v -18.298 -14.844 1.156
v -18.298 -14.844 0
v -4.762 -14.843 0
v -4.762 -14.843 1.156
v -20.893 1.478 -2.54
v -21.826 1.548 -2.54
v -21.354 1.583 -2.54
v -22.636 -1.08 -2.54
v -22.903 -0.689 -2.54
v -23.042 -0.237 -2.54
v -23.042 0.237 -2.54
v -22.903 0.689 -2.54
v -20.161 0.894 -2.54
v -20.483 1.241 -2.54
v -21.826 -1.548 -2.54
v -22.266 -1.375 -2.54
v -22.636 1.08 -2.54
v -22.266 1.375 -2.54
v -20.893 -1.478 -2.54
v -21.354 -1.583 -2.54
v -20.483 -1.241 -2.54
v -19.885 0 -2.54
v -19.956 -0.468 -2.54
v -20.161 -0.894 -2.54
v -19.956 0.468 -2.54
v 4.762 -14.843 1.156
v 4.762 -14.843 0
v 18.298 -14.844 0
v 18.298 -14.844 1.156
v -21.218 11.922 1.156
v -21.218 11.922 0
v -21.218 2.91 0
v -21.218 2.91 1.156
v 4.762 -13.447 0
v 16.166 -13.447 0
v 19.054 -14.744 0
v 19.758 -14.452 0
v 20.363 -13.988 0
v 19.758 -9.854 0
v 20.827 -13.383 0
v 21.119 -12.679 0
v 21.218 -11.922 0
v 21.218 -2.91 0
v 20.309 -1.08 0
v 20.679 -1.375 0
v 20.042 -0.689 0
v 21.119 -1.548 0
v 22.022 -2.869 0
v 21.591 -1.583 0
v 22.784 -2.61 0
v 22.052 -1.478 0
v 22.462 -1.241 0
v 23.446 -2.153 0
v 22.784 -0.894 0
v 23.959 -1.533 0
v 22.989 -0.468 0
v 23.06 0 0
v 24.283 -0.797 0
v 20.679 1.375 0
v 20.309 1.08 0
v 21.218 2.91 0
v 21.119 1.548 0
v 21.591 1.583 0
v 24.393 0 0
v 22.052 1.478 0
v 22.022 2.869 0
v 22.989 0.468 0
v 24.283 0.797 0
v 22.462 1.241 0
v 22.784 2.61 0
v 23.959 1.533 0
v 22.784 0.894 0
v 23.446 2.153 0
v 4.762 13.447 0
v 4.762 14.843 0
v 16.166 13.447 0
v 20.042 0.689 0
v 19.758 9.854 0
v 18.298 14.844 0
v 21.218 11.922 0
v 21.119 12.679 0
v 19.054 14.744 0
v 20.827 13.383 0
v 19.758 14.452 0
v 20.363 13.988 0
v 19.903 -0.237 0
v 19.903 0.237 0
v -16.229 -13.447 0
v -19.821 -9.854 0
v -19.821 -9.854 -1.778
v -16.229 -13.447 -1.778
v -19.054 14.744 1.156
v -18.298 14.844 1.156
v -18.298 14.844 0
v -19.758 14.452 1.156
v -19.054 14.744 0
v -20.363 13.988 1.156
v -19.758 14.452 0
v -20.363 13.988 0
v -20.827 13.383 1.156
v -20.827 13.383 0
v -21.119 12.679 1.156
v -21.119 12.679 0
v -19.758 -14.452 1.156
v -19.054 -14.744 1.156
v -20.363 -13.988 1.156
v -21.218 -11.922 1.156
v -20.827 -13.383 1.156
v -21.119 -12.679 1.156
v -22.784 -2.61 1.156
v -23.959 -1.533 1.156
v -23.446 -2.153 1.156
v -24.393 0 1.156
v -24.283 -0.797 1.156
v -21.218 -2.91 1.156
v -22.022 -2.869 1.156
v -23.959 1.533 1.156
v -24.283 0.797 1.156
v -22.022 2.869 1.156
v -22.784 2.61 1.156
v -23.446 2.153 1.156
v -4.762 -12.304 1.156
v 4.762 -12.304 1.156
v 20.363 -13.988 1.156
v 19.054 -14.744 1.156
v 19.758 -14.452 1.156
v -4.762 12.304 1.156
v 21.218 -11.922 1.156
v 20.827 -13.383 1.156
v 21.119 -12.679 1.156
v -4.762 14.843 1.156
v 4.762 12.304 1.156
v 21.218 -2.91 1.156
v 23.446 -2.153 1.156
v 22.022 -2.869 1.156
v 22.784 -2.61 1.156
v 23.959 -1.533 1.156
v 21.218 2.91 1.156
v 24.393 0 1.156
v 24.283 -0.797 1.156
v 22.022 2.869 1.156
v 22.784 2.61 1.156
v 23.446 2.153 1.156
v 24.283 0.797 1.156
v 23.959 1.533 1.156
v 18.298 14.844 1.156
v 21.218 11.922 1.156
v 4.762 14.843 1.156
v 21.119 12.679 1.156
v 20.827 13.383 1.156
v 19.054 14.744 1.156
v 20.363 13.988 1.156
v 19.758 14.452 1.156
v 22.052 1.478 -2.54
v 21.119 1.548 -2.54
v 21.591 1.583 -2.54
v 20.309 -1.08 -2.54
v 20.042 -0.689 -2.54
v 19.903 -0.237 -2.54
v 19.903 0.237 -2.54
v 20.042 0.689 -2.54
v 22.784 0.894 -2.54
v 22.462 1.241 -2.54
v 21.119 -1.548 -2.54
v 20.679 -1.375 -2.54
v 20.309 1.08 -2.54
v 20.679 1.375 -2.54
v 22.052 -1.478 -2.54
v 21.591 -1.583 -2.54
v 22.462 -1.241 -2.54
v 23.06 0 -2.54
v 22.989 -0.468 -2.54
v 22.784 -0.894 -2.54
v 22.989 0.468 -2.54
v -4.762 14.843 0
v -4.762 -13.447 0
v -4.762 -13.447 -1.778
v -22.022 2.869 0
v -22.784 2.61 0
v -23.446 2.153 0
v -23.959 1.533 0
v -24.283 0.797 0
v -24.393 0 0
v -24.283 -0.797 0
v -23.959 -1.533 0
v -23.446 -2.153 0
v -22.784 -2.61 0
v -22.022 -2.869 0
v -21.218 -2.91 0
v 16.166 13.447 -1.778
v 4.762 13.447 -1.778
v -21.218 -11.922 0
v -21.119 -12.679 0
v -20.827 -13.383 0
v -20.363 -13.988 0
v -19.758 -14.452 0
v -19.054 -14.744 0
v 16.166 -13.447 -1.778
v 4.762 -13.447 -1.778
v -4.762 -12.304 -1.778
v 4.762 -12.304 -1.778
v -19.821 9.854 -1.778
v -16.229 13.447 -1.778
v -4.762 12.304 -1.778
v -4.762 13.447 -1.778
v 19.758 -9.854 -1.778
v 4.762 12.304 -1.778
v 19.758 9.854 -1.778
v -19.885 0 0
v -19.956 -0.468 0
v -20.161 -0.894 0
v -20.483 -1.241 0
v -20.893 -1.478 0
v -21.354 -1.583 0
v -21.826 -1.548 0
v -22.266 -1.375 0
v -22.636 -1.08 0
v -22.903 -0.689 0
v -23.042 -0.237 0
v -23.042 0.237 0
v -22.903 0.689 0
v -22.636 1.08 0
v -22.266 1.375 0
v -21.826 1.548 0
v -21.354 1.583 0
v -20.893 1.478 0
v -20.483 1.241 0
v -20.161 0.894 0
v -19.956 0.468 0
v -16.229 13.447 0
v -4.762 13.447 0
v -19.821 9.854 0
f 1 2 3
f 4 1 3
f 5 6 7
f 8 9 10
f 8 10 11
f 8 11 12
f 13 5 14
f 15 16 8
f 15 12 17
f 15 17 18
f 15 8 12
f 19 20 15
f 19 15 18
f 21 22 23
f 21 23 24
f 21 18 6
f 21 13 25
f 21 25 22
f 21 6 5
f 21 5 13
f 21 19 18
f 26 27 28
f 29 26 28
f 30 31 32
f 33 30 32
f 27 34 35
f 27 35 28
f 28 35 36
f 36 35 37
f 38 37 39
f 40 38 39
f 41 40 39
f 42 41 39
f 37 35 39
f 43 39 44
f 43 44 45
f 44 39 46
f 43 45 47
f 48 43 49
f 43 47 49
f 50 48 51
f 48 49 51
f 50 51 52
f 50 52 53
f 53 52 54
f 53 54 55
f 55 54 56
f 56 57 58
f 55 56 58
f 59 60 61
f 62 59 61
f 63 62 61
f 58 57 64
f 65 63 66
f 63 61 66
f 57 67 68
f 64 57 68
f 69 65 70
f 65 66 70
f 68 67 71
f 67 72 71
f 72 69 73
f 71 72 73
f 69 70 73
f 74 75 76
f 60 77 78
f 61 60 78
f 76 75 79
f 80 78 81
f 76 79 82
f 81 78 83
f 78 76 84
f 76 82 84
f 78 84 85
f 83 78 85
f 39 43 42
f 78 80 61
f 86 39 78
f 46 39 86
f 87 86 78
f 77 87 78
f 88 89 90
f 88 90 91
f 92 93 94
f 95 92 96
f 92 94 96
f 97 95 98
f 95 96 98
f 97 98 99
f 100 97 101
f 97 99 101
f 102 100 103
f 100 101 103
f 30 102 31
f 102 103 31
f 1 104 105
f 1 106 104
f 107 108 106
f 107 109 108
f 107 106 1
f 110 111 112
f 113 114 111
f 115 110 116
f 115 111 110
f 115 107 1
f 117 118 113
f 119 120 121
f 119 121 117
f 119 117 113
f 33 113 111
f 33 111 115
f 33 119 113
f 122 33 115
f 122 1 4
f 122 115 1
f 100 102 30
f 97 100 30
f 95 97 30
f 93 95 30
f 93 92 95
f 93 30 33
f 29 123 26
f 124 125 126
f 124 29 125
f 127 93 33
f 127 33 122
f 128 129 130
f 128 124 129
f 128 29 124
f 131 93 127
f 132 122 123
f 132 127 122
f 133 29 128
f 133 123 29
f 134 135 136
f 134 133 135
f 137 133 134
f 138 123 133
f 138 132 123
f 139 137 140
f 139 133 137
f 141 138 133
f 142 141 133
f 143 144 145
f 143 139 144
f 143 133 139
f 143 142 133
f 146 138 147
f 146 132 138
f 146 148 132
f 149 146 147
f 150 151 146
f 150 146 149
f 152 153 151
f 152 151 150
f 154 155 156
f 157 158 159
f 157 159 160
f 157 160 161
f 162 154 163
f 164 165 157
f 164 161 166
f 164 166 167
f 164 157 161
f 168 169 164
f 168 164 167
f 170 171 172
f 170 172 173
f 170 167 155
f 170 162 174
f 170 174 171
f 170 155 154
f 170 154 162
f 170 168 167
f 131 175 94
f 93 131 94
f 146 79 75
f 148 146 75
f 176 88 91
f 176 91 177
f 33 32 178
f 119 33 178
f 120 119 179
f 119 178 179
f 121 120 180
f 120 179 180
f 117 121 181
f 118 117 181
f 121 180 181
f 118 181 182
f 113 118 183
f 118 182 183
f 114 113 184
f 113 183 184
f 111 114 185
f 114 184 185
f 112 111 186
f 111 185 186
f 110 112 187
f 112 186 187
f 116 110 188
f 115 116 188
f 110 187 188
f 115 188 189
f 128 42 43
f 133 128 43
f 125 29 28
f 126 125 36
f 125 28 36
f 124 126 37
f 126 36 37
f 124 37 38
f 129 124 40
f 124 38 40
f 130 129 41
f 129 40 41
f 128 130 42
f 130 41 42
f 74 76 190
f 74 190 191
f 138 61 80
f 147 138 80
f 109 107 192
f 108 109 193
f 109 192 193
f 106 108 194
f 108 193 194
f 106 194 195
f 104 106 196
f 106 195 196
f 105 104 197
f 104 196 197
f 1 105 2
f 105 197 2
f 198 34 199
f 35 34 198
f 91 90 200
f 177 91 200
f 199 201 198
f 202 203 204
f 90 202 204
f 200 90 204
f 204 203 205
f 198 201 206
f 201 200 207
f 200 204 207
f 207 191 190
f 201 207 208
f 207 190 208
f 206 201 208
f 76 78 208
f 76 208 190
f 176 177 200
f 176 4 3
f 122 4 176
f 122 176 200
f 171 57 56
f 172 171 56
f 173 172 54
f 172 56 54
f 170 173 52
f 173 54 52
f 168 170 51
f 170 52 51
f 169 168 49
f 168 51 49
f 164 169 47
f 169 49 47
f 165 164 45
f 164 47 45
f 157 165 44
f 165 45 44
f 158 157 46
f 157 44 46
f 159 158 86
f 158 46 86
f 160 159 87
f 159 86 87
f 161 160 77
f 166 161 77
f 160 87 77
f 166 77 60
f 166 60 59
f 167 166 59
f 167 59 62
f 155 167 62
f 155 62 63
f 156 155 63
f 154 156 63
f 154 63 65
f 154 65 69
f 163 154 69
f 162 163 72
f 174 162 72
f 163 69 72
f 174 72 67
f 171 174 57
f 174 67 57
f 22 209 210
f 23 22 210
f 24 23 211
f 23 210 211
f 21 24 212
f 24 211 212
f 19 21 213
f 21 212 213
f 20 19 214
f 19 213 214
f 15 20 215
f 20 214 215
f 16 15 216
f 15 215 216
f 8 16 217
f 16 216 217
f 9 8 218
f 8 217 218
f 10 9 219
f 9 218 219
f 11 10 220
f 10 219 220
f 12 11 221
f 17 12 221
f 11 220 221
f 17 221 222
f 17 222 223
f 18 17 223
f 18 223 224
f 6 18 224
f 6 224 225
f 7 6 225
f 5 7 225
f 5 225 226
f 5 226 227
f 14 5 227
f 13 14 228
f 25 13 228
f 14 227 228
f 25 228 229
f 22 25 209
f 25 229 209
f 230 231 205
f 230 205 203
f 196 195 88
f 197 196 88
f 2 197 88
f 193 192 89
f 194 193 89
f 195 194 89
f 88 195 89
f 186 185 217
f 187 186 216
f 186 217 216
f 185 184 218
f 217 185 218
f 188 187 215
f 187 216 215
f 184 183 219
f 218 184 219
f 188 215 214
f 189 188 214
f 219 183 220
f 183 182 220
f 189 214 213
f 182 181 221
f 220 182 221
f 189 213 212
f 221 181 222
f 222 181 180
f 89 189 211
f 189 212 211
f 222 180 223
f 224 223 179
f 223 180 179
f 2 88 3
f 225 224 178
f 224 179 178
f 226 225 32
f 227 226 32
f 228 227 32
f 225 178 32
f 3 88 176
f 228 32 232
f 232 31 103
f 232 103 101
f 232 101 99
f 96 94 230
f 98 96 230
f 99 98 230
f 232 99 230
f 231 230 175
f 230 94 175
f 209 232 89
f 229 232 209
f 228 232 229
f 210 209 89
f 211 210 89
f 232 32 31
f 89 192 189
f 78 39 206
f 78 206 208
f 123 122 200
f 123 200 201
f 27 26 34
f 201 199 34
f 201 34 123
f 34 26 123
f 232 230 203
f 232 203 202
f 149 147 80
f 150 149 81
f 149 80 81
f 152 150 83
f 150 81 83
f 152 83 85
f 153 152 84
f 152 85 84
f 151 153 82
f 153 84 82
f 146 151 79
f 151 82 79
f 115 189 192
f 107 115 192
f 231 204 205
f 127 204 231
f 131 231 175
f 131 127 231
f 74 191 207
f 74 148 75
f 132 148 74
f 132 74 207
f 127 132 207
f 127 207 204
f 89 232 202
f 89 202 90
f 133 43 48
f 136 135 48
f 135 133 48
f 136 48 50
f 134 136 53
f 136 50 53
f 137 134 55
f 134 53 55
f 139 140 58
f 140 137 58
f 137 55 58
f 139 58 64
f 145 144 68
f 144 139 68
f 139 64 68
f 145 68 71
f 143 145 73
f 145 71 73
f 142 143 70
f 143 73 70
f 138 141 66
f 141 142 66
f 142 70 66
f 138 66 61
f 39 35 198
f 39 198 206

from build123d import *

# Parameters (mm, degrees)
BOSS_EXTRUDE1_DEPTH = 1.5875
SKETCH3_W           = 9.525
SKETCH3_H           = 2.54
CUT_EXTRUDE1_DEPTH  = 29.598819744
SKETCH4_R           = 1.5875
BOSS_EXTRUDE2_DEPTH = 2.54
BOSS_EXTRUDE3_DEPTH = 1.778
SKETCH6_W           = 48.787
SKETCH6_H           = 0.4318
CUT_EXTRUDE2_DEPTH  = 19.05


with BuildPart() as part:
    # Sketch2 → Boss-Extrude1 (new body)
    with BuildSketch(Plane.XY):
        with BuildLine():
            Line((21.2185, 2.909935566), (21.2185, 11.9225))
            ThreePointArc((21.2185, 11.9225), (20.362958908, 13.987958908), (18.2975, 14.8435))
            Line((18.2975, 14.8435), (-18.2975, 14.8435))
            ThreePointArc((-18.2975, 14.8435), (-20.362958908, 13.987958908), (-21.2185, 11.9225))
            Line((-21.2185, 11.9225), (-21.2185, 2.909935566))
            ThreePointArc((-21.2185, 2.909935566), (-24.3935, 0), (-21.2185, -2.909935566))
            Line((-21.2185, -2.909935566), (-21.2185, -11.9225))
            ThreePointArc((-21.2185, -11.9225), (-20.362958908, -13.987958908), (-18.2975, -14.8435))
            Line((-18.2975, -14.8435), (18.2975, -14.8435))
            ThreePointArc((18.2975, -14.8435), (20.362958908, -13.987958908), (21.2185, -11.9225))
            Line((21.2185, -11.9225), (21.2185, -2.909935566))
            ThreePointArc((21.2185, -2.909935566), (24.3935, 0), (21.2185, 2.909935566))
        make_face()
    extrude(amount=BOSS_EXTRUDE1_DEPTH)

    # Sketch3 → Cut-Extrude1 (cut, through all)
    with BuildSketch(Plane.XY.offset(1.5875)):
        with Locations((0, -13.5735)):
            Rectangle(SKETCH3_W, SKETCH3_H)
        with Locations((0, 13.5735)):
            Rectangle(SKETCH3_W, SKETCH3_H)
    extrude(amount=-CUT_EXTRUDE1_DEPTH, mode=Mode.SUBTRACT)

    # Sketch4 → Boss-Extrude2 (add)
    with BuildSketch(Plane(origin=(0, 0, 0), x_dir=(-1, 0, 0), z_dir=(0, 0, -1))):
        with Locations(Location((-21.4725, 0, 0), (0, 0, 180))):
            Circle(SKETCH4_R)
        with Locations(Location((21.4725, 0, 0), (0, 0, 180))):
            Circle(SKETCH4_R)
    extrude(amount=BOSS_EXTRUDE2_DEPTH)

    # Sketch5 → Boss-Extrude3 (add)
    with BuildSketch(Plane(origin=(0, 0, 0), x_dir=(-1, 0, 0), z_dir=(0, 0, -1))):
        Polygon((-19.757999981, 9.854397583), (-16.165897533, 13.446500031), (-4.7625, 13.446500031), (-4.7625, 12.3035), (4.7625, 12.3035), (4.7625, 13.446500031), (16.229397533, 13.446500031), (19.821499981, 9.854397583), (19.821499981, -9.854397583), (16.229397533, -13.446500031), (4.7625, -13.446500031), (4.7625, -12.3035), (-4.7625, -12.3035), (-4.7625, -13.446500031), (-16.165897533, -13.446500031), (-19.757999981, -9.854397583), align=None)
    extrude(amount=BOSS_EXTRUDE3_DEPTH)

    # Sketch6 → Cut-Extrude2 (cut, symmetric)
    with BuildSketch(Plane(origin=(0, 0, 0), x_dir=(1, 0, 0), z_dir=(0, 1, 0))):
        with Locations((0, -1.3716)):
            Rectangle(SKETCH6_W, SKETCH6_H)
    extrude(amount=CUT_EXTRUDE2_DEPTH, both=True, mode=Mode.SUBTRACT)


solid = part.part
